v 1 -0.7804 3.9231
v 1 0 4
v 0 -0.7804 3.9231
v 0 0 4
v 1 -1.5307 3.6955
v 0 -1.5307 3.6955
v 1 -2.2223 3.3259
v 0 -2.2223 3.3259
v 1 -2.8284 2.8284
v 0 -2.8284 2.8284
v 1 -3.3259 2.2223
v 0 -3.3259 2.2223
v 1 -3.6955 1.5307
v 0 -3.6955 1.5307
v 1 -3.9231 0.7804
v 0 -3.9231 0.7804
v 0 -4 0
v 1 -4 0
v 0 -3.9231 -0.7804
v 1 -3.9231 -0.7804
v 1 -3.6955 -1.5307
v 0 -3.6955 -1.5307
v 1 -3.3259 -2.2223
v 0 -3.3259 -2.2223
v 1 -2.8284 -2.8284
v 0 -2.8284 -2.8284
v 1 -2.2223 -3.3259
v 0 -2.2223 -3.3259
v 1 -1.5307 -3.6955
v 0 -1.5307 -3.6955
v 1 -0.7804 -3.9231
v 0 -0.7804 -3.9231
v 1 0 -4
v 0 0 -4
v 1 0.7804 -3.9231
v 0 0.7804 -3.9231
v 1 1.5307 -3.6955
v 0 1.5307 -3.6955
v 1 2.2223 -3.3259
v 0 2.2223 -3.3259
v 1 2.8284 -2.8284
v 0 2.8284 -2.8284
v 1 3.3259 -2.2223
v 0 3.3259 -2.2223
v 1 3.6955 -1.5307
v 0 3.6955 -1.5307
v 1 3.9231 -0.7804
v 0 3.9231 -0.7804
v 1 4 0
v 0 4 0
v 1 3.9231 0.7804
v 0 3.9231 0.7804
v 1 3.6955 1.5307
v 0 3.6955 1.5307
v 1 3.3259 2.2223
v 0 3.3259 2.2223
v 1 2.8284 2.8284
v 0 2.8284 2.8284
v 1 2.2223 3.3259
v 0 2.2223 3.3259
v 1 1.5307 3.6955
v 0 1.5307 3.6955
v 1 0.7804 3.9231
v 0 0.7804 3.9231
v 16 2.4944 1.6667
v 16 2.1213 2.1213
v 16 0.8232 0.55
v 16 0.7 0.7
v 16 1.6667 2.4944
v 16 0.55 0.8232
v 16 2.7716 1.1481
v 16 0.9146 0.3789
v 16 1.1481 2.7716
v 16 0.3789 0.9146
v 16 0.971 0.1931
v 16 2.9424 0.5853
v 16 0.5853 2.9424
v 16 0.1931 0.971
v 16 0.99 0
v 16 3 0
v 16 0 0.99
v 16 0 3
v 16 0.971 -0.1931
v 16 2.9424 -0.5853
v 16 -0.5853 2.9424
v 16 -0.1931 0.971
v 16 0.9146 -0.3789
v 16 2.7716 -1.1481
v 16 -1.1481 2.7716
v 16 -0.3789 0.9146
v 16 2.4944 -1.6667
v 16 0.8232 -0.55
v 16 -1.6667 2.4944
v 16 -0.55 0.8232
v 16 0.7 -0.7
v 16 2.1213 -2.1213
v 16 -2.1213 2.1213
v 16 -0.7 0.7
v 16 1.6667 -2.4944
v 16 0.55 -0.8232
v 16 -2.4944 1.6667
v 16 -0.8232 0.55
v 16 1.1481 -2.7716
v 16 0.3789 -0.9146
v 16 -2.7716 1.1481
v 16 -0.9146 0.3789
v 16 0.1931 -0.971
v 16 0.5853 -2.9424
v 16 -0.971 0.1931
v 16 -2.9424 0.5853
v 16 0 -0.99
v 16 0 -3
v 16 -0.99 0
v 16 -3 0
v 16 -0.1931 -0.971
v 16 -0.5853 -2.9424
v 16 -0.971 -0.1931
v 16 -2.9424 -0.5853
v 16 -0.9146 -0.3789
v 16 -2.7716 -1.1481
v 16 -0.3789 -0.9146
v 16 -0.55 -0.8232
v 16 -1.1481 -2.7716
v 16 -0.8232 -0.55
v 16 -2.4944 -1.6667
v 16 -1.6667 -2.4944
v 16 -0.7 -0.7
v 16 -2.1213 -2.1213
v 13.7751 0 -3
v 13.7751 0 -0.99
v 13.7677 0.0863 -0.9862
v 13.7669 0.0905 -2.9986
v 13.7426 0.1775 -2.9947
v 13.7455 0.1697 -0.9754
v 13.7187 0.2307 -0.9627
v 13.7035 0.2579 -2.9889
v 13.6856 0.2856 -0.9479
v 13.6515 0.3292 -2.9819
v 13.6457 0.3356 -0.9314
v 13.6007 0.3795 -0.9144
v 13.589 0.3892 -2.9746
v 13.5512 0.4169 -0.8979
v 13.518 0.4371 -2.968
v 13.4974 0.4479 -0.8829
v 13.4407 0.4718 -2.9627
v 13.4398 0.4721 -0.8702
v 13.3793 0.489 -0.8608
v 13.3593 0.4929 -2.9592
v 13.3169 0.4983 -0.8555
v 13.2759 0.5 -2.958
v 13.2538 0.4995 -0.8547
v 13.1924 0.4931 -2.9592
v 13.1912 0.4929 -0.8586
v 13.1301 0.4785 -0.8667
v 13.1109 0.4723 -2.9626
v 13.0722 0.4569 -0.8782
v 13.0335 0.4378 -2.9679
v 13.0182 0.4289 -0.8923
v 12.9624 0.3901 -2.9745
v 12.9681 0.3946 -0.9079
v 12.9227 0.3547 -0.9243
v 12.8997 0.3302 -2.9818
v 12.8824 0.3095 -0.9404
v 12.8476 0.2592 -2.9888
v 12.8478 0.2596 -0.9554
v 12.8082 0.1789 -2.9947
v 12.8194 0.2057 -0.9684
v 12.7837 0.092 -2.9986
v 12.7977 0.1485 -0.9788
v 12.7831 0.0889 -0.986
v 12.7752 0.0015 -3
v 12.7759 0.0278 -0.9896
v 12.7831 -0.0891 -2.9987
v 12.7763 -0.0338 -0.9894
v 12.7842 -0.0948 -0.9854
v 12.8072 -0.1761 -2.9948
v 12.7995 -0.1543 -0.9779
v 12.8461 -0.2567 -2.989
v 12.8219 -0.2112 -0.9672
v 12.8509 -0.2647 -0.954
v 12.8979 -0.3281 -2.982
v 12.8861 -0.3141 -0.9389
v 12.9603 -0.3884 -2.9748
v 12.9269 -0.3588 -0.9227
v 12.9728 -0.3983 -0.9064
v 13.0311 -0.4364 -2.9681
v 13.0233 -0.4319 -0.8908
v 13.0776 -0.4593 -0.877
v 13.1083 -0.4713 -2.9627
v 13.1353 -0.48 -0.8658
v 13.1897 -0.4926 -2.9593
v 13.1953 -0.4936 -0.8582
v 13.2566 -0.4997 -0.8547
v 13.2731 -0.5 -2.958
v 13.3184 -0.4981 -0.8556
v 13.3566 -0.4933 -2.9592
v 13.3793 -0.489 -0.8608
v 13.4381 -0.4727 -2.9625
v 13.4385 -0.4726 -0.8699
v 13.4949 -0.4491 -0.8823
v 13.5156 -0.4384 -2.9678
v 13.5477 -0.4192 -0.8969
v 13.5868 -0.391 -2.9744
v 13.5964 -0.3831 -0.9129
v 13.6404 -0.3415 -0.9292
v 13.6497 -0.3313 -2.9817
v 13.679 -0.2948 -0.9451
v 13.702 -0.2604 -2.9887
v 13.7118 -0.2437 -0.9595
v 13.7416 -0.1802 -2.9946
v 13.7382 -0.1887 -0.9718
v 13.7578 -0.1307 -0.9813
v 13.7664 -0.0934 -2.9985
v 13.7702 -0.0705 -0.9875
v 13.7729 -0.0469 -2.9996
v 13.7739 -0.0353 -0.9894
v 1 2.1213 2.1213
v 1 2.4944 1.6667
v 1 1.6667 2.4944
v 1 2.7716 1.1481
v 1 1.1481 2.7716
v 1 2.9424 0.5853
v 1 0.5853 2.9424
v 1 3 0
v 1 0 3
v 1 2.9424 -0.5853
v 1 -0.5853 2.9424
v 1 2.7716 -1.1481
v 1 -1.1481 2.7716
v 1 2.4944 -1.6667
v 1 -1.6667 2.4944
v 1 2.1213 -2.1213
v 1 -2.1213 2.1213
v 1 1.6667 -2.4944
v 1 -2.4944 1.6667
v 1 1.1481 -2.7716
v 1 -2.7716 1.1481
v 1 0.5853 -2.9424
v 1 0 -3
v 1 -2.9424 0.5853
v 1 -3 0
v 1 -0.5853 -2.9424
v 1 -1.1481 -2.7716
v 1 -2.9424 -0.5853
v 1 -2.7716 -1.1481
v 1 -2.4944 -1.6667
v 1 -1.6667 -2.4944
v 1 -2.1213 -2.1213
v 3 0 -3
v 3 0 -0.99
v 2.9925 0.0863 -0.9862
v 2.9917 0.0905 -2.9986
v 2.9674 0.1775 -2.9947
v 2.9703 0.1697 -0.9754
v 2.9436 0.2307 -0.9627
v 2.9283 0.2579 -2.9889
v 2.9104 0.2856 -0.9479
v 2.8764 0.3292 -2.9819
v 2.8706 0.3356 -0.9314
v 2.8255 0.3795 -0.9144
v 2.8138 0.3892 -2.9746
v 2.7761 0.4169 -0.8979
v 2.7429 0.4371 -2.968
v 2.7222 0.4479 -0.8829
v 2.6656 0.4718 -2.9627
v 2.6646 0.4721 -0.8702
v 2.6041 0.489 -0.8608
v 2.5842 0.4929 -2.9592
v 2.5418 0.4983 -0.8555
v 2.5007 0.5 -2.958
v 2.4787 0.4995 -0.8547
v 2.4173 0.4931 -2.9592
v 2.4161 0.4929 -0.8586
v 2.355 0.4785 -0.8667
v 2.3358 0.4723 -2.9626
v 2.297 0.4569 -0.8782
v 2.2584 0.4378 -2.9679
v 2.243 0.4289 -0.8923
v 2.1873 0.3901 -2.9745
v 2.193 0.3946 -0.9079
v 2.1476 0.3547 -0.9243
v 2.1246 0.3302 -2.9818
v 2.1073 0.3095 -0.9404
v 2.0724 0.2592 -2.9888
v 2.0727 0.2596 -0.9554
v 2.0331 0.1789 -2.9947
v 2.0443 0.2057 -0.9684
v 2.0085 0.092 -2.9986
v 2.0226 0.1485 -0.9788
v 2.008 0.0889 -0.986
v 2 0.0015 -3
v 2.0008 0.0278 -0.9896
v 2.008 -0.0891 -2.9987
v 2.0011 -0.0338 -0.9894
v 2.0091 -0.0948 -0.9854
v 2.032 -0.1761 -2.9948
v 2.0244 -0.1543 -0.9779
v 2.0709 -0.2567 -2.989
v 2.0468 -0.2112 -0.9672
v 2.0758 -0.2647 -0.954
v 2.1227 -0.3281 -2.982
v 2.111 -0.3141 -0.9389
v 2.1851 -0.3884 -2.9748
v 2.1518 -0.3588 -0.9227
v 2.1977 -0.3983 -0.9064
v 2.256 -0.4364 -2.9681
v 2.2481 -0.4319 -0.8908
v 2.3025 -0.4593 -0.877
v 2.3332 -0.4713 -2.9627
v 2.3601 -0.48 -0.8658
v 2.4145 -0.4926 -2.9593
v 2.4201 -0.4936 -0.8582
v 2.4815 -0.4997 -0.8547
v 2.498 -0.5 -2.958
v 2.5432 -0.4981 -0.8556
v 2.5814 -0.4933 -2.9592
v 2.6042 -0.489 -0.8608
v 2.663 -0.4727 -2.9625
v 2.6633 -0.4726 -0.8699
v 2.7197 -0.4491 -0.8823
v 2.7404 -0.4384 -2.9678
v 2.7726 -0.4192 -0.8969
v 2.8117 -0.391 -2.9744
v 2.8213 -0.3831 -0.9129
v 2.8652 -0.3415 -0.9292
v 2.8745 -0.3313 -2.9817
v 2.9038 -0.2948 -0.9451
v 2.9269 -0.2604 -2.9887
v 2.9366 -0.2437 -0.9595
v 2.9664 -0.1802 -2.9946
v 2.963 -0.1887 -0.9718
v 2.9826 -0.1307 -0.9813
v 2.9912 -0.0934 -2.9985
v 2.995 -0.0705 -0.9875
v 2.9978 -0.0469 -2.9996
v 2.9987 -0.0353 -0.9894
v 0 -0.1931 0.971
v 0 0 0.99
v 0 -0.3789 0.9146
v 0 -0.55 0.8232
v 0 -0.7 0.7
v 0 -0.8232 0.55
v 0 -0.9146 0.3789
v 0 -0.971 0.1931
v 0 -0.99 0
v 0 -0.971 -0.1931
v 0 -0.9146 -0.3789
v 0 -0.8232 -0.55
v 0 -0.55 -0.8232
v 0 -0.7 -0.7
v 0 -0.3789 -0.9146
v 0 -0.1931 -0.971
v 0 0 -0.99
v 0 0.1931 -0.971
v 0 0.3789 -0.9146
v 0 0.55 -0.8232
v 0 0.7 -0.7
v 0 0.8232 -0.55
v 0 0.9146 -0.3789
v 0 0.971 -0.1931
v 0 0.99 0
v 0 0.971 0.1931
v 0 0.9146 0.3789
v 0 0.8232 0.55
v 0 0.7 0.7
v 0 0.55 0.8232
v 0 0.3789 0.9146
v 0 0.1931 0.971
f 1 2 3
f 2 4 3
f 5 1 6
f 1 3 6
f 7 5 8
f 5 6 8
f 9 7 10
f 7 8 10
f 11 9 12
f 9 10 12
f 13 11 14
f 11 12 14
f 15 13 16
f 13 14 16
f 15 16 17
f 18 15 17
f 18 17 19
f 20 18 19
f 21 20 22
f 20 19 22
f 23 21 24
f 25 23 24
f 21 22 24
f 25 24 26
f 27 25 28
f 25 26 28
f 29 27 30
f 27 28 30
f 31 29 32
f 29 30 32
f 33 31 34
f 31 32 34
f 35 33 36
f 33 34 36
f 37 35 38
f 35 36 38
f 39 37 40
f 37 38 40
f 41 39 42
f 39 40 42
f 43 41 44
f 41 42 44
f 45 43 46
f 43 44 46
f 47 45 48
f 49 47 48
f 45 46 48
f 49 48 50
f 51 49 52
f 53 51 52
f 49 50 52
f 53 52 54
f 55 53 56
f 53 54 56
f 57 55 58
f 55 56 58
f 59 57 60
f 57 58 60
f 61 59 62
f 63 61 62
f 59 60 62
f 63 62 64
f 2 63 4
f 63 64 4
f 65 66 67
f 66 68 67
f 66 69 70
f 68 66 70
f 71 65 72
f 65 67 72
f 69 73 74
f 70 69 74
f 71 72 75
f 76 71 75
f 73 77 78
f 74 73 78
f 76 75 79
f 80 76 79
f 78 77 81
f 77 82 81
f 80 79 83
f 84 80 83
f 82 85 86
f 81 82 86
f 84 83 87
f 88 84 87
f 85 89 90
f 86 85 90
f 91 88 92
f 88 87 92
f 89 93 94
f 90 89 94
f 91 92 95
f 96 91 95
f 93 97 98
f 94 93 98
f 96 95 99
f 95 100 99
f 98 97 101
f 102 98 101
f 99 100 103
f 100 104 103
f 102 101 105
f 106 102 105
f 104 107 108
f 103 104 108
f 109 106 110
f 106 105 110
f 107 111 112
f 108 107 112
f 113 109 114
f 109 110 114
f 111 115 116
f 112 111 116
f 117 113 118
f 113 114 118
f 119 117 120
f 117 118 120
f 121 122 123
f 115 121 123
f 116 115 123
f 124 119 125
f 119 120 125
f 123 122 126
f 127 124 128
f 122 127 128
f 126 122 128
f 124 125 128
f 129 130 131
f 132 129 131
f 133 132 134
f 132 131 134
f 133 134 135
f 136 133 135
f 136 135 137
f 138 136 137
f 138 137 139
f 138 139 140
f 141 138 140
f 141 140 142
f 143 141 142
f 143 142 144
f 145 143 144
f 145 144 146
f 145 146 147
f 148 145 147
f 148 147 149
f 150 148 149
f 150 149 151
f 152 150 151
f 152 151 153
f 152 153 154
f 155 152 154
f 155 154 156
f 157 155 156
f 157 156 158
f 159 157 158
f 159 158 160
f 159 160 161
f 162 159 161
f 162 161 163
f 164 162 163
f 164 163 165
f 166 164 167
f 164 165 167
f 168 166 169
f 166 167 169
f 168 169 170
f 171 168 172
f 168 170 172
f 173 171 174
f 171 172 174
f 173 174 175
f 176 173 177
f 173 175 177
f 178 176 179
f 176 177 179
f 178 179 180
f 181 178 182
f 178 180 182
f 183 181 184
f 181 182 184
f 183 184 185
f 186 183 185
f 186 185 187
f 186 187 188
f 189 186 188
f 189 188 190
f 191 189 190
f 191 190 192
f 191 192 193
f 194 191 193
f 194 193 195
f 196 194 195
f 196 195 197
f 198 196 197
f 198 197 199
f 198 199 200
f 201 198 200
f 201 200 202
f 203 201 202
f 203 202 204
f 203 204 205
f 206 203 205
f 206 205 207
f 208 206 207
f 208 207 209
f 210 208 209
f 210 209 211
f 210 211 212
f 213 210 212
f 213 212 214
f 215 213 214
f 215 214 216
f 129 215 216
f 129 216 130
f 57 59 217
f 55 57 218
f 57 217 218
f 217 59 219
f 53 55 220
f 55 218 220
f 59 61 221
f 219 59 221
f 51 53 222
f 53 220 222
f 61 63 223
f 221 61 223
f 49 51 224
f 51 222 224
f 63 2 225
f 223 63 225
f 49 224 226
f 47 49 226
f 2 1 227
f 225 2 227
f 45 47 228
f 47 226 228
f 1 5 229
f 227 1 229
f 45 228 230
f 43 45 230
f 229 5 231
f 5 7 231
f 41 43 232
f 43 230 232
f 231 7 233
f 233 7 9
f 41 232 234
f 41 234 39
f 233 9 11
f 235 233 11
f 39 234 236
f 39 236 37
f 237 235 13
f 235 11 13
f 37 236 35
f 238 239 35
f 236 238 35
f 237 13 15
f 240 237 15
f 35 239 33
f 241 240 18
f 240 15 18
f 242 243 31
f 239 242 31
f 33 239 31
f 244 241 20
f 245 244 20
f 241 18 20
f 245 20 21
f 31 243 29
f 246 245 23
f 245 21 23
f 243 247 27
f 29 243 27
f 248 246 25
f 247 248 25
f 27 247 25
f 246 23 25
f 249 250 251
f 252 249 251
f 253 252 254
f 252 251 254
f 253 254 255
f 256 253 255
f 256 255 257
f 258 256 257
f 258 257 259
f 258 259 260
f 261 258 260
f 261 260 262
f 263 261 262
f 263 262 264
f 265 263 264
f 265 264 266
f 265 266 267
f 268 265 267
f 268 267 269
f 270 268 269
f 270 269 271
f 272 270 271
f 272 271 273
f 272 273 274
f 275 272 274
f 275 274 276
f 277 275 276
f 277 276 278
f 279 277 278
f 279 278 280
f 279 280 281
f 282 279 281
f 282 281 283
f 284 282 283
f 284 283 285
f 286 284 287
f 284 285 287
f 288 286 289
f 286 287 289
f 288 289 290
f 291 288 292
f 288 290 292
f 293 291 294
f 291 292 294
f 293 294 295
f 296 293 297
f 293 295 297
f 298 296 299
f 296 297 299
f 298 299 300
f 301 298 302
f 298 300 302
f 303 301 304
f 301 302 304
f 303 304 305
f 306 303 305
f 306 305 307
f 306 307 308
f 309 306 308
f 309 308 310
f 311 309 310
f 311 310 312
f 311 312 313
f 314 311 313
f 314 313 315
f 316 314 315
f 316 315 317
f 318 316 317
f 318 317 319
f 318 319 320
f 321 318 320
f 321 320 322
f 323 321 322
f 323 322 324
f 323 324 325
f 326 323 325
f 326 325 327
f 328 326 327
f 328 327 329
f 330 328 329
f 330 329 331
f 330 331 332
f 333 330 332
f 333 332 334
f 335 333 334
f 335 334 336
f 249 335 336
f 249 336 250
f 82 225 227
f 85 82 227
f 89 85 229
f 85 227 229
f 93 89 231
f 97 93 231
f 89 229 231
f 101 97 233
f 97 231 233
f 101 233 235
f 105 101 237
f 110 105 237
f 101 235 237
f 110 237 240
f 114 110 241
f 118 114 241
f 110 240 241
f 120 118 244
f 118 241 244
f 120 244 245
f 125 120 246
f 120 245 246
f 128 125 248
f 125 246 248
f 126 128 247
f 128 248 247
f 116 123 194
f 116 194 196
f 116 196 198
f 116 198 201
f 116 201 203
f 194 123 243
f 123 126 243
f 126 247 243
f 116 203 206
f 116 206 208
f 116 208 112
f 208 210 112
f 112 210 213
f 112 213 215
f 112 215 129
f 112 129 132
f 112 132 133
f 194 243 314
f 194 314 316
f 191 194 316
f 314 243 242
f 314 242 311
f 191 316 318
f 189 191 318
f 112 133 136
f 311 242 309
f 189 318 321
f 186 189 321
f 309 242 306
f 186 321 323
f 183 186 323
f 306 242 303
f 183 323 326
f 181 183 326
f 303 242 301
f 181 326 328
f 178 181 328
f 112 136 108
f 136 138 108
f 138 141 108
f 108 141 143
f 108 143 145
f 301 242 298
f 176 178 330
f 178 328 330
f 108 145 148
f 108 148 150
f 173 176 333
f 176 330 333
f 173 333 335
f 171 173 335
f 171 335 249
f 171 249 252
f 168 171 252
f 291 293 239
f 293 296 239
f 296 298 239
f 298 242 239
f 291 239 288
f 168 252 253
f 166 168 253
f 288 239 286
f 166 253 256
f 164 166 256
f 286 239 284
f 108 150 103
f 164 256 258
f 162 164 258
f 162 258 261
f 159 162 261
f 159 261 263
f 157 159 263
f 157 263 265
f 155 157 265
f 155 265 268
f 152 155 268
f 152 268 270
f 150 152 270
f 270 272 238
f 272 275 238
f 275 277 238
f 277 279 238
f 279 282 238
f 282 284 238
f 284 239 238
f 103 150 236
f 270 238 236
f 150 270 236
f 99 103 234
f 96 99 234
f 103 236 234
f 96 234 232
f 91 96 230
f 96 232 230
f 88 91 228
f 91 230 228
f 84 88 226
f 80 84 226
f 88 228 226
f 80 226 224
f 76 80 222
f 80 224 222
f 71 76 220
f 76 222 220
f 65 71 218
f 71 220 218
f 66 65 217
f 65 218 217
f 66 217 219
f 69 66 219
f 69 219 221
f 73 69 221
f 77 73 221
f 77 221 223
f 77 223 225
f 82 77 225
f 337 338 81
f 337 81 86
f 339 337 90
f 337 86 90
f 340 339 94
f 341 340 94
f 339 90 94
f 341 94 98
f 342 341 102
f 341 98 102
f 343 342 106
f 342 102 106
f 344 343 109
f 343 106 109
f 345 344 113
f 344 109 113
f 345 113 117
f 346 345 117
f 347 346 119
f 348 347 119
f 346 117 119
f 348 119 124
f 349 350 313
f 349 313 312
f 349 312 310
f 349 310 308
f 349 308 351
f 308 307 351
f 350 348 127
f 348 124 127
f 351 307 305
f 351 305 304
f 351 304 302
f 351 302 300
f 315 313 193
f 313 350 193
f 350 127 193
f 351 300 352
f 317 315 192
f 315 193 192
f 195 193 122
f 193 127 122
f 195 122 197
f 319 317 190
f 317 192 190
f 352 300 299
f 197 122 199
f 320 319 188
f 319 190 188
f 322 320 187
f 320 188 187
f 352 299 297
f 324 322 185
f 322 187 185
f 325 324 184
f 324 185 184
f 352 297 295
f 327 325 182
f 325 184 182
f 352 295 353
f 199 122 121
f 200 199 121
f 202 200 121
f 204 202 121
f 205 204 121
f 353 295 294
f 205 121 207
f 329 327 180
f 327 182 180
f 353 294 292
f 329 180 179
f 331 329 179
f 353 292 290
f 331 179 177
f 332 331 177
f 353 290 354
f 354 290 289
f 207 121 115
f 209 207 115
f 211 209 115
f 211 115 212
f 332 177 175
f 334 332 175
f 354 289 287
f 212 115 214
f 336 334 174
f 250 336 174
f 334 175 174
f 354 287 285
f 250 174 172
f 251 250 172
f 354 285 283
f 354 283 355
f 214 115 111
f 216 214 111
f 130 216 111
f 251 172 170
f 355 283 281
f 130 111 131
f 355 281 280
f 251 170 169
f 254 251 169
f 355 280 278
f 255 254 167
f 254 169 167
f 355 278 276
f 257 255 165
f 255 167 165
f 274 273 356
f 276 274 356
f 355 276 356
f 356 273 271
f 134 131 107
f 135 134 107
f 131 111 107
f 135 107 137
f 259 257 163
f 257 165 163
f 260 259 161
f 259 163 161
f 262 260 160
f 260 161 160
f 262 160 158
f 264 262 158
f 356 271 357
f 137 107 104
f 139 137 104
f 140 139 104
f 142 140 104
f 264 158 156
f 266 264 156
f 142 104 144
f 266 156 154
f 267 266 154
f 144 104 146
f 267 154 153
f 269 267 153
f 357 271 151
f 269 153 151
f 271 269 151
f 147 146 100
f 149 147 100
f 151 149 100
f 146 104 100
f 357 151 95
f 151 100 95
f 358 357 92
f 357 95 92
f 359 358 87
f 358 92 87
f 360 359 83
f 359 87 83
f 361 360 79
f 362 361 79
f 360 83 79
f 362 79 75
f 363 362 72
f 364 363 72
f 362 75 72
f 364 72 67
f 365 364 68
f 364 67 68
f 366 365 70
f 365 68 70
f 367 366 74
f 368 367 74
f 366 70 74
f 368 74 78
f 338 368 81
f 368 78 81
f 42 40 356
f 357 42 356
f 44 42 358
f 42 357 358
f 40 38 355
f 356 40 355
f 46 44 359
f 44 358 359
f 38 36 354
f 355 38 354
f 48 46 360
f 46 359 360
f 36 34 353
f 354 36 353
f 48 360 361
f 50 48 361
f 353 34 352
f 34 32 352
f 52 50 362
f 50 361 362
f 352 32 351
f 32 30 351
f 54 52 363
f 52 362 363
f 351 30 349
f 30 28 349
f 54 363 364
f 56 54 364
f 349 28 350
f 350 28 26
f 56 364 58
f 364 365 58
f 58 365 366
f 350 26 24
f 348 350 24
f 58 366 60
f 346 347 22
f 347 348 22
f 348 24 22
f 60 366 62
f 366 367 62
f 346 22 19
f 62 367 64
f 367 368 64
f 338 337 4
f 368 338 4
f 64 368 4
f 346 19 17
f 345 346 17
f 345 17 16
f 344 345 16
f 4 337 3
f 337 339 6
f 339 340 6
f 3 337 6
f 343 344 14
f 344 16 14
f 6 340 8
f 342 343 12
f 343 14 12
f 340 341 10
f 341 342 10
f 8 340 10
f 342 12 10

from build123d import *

# Parameters (mm, degrees)
F2_R     = 0.5
F3_DEPTH = 4.001


# Not quite as in the source:
# - a feature names something its author has since deleted; it is built from what else it names


with BuildPart() as f1:
    # F0 (on Front) → F1 (revolve)
    with BuildSketch(Plane.XZ):
        Polygon((0, 4), (0, 0.99), (16, 0.99), (16, 3), (1, 3), (1, 4), align=None)
    revolve(axis=Axis((-1.1582460975, 0, 0), (1, 0, 0)))

    # F2 (on Top) → F3 (cut, through all)
    with BuildSketch(Plane.XY):
        with Locations((2.5, 0)):
            Circle(F2_R)
        with Locations((13.275148347, 0)):
            Circle(F2_R)
    extrude(amount=-F3_DEPTH, mode=Mode.SUBTRACT)


solid = f1.part
